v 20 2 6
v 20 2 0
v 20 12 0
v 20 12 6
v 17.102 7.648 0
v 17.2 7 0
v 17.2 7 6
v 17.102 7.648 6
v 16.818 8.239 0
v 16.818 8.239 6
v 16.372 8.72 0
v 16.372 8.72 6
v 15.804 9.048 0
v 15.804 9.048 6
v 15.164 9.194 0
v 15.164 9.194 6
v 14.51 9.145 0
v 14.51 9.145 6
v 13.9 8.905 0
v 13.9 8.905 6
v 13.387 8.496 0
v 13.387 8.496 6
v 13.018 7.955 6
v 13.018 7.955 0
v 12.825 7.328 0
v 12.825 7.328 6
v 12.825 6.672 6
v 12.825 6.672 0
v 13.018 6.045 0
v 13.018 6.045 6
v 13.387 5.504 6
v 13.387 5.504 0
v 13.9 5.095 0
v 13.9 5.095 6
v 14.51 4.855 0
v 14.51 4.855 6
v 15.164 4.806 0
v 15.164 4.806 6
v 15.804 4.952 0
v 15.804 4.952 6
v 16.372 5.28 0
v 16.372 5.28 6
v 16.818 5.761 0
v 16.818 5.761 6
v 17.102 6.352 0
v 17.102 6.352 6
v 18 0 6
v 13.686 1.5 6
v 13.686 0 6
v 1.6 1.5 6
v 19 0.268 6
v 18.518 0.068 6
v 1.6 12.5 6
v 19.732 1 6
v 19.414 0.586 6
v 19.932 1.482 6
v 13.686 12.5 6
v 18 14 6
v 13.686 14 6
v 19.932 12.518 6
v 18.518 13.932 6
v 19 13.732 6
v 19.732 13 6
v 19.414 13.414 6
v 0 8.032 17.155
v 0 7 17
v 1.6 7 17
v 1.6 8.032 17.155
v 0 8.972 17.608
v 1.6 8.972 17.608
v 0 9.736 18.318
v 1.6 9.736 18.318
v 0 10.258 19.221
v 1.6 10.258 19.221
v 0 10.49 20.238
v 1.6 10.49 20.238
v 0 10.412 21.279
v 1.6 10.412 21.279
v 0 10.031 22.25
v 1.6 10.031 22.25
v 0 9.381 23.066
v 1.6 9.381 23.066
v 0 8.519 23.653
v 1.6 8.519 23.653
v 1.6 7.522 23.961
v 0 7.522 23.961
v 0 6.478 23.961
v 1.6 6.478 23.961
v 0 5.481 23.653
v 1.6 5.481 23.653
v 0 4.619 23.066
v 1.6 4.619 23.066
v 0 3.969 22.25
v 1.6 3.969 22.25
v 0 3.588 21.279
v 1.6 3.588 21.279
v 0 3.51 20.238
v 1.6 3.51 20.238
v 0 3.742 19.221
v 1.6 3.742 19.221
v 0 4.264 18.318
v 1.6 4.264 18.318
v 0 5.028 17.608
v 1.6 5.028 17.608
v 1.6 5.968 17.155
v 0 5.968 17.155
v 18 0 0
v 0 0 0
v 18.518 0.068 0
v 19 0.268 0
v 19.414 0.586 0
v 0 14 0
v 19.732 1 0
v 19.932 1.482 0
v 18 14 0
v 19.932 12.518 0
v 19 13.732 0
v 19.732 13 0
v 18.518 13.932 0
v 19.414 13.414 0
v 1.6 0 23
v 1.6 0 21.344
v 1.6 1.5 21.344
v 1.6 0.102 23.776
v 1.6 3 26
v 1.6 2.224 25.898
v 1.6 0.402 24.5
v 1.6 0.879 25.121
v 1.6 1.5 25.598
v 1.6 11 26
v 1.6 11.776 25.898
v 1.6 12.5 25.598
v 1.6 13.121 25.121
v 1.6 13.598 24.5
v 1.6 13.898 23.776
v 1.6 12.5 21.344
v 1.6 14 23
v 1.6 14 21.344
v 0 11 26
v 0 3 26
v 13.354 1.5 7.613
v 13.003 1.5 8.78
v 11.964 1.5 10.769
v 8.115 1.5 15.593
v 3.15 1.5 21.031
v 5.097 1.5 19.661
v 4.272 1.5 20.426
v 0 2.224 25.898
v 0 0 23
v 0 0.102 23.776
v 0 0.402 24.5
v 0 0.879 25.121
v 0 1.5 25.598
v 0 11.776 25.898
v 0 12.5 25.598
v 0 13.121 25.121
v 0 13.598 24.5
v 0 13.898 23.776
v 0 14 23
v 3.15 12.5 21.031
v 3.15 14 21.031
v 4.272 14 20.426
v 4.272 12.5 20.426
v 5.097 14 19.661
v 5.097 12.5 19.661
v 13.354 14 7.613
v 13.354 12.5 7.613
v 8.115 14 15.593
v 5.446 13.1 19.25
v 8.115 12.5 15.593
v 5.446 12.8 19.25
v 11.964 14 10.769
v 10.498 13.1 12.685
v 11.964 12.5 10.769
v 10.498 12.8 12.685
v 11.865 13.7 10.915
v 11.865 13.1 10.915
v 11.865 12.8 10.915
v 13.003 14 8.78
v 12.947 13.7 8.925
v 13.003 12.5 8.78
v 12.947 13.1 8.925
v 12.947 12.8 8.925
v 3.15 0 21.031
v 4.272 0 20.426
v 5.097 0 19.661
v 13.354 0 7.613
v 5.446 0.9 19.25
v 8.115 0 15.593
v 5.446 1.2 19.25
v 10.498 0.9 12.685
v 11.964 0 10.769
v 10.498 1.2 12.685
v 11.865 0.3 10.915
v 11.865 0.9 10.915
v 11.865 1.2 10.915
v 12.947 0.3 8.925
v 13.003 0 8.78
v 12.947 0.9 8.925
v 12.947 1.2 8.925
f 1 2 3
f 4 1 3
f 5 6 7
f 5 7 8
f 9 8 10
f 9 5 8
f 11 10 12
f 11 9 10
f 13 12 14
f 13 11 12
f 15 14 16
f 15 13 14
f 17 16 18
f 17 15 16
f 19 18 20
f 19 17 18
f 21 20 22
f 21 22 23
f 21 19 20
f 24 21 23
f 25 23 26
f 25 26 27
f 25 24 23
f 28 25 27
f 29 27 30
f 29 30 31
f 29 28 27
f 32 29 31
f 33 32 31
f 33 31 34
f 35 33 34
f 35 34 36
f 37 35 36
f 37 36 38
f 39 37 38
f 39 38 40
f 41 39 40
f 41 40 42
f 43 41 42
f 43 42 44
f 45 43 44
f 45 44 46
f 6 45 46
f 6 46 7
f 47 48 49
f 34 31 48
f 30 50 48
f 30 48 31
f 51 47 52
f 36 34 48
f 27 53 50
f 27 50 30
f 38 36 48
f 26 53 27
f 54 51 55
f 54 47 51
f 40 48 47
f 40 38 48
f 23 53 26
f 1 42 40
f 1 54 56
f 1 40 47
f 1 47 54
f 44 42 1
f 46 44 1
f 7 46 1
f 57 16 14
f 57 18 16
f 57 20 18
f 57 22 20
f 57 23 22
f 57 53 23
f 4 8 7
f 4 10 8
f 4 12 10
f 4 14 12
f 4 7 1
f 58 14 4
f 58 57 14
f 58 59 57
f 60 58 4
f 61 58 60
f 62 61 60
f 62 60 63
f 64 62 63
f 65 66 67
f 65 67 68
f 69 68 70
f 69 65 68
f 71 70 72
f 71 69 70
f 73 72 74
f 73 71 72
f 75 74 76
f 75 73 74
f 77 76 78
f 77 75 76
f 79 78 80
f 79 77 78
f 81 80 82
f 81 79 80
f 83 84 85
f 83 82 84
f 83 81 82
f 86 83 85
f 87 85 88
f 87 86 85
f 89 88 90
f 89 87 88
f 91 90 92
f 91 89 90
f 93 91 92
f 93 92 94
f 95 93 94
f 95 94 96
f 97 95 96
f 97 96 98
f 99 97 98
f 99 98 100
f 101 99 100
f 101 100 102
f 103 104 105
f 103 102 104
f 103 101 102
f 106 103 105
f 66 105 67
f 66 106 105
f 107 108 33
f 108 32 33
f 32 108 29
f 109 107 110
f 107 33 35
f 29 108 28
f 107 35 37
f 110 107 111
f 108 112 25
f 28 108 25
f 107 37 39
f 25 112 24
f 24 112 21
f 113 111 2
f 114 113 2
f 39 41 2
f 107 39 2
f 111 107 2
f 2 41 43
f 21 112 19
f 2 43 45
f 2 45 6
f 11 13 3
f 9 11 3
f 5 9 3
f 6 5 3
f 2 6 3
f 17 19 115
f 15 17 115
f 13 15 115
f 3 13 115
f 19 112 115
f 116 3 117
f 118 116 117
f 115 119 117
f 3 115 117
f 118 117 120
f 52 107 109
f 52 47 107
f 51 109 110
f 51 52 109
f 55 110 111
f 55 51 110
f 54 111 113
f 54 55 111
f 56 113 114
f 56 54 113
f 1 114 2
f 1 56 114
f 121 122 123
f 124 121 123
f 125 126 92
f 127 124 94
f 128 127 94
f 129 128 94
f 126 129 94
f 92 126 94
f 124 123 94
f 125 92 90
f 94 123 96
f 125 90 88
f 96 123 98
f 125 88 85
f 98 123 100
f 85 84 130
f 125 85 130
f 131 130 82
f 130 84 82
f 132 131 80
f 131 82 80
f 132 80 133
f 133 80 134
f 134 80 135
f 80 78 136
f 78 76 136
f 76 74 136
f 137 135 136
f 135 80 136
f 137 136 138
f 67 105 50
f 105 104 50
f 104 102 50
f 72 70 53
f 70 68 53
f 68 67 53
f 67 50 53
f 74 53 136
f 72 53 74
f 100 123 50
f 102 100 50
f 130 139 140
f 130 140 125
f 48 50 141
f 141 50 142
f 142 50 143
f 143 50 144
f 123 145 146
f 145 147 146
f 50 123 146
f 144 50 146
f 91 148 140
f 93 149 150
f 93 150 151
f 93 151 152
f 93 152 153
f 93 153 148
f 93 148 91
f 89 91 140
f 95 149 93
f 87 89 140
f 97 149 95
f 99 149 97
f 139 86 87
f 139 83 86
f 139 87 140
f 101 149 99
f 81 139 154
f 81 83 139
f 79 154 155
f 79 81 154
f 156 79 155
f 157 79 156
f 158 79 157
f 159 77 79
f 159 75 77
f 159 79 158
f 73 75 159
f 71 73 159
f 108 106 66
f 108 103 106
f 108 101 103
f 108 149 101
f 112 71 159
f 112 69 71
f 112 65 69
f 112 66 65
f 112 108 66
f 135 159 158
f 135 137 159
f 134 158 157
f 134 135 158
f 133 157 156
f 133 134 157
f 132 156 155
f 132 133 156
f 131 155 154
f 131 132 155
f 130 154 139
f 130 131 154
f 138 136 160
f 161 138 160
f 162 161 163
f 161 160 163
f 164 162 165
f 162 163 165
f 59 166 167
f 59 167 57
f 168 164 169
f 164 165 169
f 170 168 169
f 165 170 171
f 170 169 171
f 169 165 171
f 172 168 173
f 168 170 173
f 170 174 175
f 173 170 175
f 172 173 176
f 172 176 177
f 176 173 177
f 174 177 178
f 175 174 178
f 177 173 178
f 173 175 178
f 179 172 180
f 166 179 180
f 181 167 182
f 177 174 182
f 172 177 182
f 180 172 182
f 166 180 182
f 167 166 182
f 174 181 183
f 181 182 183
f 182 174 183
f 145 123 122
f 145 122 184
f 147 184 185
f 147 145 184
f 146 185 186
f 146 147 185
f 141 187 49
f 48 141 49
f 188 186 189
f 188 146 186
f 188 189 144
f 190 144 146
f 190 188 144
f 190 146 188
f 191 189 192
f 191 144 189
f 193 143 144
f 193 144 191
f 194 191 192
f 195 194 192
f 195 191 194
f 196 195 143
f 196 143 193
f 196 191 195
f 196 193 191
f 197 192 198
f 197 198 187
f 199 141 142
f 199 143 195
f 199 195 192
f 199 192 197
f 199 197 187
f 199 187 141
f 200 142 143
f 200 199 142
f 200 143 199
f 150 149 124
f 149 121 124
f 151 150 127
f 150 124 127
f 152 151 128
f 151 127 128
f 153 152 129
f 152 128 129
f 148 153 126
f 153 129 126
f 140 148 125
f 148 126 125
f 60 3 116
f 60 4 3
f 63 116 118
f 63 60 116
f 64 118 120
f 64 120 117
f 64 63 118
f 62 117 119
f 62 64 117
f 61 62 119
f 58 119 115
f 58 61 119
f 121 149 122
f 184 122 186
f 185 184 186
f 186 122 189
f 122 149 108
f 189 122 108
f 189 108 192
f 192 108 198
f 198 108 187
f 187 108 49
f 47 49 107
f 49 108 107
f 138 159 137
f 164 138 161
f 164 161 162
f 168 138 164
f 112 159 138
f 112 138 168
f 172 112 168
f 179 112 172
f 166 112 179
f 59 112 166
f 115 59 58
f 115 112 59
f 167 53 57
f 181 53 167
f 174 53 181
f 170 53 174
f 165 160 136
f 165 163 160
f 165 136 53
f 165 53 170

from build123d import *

# Parameters (mm, degrees)
PAD_DEPTH         = 1.5
CYLINDER001_R     = 2.2
CYLINDER001_DEPTH = 10
CYLINDER_R        = 3.5
CYLINDER_DEPTH    = 10
BOX001_W          = 1.6
BOX001_H          = 14
BOX001_DEPTH      = 20
FILLET001_R       = 3
BOX_W             = 20
BOX_H             = 14
BOX_DEPTH         = 6
FILLET_R          = 2


with BuildPart() as side_wall_body:
    # Sketch → Pad (new body)
    with BuildSketch(Plane.XZ):
        with BuildLine():
            Line((0, 21.297815), (0, 0))
            Line((0, 0), (14.6909, 0))
            add(Edge.make_bspline(
                [(0, 21.297815), (3.272985, 21.659939), (5.756082, 19.125105), (7.618405, 16.072966), (10.515349, 12.71044), (13.308836, 9.192718), (13.722685, 5.778458), (14.6909, 0)],
                knots=[0, 0, 0, 0, 0.2, 0.4, 0.6, 0.8, 1, 1, 1, 1], degree=3))
        make_face()
    extrude(amount=PAD_DEPTH)


with BuildPart() as side_wall_fusion:
    # Part__Mirroring: instance of side wall body
    add(side_wall_body.part.mirror(Plane(origin=(0, 5.5, 0), x_dir=(1, 0, 0), z_dir=(0, 1, 0))))

    # Fusion002: union side wall body
    add(side_wall_body.part)


with BuildPart() as side_wall_fusion_1:
    # Fusion002 placement: moved
    add(side_wall_fusion.part.moved(Location((0, 1.5, 0))))


with BuildPart() as bolt_hole:
    # Cylinder001 → Cylinder001 (new body)
    with BuildSketch(Plane(origin=(15, 7, -4), x_dir=(1, 0, 0), z_dir=(0, 0, 1))):
        Circle(CYLINDER001_R)
    extrude(amount=CYLINDER001_DEPTH)


with BuildPart() as hole_fusion:
    # Cylinder → Cylinder (new body)
    with BuildSketch(Plane(origin=(-3, 7, 20.5), x_dir=(0, 0, -1), z_dir=(1, 0, 0))):
        Circle(CYLINDER_R)
    extrude(amount=CYLINDER_DEPTH)

    # Fusion001: union bolt hole
    add(bolt_hole.part)


with BuildPart() as socket_fillet:
    # Box001 → Box001 (new body)
    with BuildSketch(Plane.XY.offset(6)):
        with Locations((0.8, 7)):
            Rectangle(BOX001_W, BOX001_H)
    extrude(amount=BOX001_DEPTH)

    # Fillet001
    fillet001_edges = [socket_fillet.edges().sort_by_distance(p)[0] for p in [
        (0.8, 0, 26),
        (0.8, 14, 26),
    ]]
    fillet(fillet001_edges, radius=FILLET001_R)


with BuildPart() as audio_socket_fusion:
    # Box → Box (new body)
    with BuildSketch(Plane.XY):
        with Locations((10, 7)):
            Rectangle(BOX_W, BOX_H)
    extrude(amount=BOX_DEPTH)

    # Fillet
    fillet_edges = [audio_socket_fusion.edges().sort_by_distance(p)[0] for p in [
        (20, 0, 3),
        (20, 14, 3),
    ]]
    fillet(fillet_edges, radius=FILLET_R)

    # Fusion: union socket fillet
    add(socket_fillet.part)

    # Cut: cut hole fusion
    add(hole_fusion.part, mode=Mode.SUBTRACT)

    # Fusion003: union side wall fusion
    add(side_wall_fusion_1.part)


solid = audio_socket_fusion.part
